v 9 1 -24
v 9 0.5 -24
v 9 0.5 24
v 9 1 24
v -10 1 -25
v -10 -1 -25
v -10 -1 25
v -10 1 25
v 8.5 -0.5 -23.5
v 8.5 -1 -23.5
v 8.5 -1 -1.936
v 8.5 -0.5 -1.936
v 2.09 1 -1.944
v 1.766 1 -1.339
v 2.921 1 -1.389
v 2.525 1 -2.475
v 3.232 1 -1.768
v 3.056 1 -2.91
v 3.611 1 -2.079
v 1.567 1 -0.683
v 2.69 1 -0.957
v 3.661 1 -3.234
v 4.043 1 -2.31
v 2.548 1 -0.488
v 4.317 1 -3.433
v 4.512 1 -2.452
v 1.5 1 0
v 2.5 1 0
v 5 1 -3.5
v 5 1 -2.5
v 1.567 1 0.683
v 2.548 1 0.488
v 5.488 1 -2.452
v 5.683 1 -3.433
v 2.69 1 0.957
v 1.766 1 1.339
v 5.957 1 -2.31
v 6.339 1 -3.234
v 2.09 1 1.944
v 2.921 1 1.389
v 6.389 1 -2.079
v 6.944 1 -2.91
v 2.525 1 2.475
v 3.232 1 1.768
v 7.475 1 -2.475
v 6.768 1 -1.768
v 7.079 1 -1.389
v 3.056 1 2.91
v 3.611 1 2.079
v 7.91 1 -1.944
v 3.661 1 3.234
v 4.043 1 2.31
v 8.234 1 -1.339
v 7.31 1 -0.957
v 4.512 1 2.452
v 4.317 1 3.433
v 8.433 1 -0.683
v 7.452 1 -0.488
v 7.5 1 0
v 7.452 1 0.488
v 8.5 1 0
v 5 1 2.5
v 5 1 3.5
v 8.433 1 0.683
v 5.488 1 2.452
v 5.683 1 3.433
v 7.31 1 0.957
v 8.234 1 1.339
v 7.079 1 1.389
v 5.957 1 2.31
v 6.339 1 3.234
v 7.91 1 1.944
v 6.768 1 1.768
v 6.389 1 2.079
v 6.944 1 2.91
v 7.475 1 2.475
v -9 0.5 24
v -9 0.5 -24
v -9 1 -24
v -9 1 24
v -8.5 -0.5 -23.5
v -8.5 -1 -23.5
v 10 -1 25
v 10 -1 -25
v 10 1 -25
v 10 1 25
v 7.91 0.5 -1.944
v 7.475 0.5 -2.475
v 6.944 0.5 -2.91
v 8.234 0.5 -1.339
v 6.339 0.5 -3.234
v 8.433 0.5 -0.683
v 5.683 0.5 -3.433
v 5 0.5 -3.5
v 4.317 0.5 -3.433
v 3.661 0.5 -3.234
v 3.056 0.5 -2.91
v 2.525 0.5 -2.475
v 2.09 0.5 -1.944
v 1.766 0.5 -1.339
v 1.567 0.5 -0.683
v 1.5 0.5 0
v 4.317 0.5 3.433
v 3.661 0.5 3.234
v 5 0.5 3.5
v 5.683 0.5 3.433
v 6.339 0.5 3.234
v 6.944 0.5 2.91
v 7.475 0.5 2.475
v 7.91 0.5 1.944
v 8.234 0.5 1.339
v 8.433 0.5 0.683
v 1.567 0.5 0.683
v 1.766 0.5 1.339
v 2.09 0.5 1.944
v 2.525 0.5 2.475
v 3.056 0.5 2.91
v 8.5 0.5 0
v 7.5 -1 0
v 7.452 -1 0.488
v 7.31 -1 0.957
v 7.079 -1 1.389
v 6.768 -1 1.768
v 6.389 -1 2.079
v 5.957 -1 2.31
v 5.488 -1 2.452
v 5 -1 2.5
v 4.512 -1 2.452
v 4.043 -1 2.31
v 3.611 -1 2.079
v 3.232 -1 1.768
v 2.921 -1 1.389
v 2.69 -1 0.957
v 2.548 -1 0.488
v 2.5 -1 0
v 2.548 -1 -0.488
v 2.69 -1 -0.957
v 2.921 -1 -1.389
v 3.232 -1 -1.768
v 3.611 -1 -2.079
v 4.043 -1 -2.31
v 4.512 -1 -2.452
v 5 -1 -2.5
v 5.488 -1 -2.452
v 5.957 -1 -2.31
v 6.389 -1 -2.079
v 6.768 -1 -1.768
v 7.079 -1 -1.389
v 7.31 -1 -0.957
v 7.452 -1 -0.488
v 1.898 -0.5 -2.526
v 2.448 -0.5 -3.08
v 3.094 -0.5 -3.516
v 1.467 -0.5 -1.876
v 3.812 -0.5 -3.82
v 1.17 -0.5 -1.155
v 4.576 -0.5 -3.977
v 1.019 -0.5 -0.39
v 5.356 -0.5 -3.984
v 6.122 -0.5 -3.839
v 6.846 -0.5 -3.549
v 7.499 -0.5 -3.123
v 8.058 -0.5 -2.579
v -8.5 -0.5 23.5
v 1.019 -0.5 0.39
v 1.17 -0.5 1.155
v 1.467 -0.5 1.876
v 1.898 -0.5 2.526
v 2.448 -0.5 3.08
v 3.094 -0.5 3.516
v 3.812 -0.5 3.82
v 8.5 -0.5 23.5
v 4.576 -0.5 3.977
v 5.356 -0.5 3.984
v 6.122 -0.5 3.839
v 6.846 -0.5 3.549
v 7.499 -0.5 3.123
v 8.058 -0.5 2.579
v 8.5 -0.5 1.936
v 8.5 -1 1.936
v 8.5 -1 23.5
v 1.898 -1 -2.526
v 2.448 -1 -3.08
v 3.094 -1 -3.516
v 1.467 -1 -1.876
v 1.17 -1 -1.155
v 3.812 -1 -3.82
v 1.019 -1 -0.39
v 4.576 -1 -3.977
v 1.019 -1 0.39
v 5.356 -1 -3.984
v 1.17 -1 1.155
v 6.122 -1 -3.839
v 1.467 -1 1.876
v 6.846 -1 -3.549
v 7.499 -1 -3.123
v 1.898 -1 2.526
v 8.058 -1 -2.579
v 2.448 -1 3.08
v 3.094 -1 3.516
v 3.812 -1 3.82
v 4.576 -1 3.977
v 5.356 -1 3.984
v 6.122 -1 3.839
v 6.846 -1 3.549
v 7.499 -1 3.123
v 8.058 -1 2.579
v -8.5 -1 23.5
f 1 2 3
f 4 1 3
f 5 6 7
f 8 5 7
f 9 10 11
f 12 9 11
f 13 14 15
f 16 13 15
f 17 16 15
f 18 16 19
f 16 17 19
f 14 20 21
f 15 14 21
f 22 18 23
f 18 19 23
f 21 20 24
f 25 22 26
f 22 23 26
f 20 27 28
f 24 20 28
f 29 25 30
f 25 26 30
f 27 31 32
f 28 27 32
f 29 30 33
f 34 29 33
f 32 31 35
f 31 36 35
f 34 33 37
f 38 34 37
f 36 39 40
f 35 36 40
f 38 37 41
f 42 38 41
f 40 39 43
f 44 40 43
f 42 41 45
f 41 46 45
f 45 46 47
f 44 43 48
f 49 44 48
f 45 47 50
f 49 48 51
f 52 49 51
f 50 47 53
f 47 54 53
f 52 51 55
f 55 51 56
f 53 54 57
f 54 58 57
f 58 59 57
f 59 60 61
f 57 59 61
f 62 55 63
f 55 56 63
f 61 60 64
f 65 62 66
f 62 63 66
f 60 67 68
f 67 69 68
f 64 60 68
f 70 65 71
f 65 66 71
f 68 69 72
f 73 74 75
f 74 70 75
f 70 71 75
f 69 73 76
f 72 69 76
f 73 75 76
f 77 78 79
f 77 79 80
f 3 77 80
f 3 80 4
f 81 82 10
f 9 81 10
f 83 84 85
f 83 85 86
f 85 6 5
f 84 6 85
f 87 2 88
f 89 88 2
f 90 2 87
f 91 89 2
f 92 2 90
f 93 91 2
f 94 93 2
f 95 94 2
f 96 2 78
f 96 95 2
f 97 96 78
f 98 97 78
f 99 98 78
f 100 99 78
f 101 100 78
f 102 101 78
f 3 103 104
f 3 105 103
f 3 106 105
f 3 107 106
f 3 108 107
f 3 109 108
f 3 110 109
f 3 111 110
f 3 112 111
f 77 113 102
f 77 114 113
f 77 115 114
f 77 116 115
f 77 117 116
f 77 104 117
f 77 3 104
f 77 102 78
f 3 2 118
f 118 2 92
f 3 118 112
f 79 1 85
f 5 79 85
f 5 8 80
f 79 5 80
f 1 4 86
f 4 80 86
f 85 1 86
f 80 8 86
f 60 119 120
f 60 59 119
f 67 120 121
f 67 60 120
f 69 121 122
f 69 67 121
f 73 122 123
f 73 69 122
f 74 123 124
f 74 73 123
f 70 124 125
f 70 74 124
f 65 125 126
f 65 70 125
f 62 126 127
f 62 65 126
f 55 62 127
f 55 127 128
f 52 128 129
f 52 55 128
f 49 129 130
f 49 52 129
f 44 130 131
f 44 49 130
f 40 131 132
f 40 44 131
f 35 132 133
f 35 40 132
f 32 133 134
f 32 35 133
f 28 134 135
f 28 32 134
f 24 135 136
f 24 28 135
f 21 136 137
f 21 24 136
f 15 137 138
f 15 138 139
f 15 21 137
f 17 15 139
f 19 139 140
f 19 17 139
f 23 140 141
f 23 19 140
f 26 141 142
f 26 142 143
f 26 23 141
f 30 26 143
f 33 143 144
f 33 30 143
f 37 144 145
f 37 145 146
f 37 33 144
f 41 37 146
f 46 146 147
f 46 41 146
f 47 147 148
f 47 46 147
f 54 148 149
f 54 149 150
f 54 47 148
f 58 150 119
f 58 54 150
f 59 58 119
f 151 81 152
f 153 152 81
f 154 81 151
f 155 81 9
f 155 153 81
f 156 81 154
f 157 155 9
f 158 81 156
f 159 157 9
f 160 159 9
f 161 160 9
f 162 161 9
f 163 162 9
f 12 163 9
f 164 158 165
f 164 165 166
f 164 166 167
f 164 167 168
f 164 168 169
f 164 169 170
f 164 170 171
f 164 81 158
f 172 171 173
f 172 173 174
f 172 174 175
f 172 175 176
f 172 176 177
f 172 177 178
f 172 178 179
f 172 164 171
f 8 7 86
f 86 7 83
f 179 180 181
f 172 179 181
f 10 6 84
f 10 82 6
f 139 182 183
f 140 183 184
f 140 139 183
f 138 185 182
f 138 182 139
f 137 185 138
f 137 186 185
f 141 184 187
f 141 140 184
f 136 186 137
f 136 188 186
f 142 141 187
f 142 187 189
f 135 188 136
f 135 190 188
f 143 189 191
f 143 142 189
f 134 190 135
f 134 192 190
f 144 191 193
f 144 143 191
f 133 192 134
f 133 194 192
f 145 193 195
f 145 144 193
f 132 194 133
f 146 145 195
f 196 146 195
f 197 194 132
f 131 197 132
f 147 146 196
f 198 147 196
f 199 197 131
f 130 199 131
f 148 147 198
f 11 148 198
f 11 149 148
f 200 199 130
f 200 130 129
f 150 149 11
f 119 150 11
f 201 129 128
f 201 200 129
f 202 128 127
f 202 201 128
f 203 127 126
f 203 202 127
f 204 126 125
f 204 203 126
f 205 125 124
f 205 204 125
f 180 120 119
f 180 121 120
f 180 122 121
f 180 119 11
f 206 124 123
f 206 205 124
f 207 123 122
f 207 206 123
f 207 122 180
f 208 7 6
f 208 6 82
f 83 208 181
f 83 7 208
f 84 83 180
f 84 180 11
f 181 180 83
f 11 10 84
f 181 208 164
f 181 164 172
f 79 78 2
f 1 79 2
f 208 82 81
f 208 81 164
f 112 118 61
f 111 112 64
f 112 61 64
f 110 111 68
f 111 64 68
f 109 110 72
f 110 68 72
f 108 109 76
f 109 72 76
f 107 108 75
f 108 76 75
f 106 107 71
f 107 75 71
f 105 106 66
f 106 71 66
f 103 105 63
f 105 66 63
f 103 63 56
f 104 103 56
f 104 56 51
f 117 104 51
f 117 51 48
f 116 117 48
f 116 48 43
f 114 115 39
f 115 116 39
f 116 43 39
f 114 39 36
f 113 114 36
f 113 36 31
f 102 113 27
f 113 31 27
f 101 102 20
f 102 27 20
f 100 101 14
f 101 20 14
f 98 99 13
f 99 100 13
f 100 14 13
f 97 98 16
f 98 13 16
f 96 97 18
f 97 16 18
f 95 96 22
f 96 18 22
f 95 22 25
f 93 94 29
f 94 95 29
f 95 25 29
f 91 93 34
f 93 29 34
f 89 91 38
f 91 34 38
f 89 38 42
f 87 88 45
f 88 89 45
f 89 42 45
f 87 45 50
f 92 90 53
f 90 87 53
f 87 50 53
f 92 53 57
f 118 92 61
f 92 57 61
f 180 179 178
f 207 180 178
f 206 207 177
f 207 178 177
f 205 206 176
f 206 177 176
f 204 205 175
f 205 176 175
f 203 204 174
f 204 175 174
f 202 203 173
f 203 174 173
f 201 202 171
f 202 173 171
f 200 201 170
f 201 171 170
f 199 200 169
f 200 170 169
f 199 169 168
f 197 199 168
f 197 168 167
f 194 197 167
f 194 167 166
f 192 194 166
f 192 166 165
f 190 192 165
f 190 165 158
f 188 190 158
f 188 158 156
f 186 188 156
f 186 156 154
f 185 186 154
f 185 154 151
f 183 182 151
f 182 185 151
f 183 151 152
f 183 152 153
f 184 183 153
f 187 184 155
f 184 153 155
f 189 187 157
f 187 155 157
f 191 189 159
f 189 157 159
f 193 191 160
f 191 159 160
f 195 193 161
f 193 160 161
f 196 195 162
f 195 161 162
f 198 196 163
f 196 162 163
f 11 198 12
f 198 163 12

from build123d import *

# Parameters (mm, degrees)
F0_W         = 20
F0_H         = 50
F0_R         = 2.5
F1_DEPTH     = 1
F2_T         = -1.5
F3_T         = 1
F3_T3_DEPTH  = 23.5635083269
F3_T5_DEPTH  = 2.5
F3_T7_DEPTH  = 23.5635083269
F3_T9_DEPTH  = 19
F3_T11_DEPTH = 49
F3_T14_ANGLE = 302.0899512573


# Not quite as in the source:
# - a shell that OpenCascade refuses in one call is made with other operations: the cavity is built on its own and cut out


with BuildPart() as f1:
    # F0 (on Front) → F1 (new body, symmetric)
    with BuildSketch(Plane.XZ):
        Rectangle(F0_W, F0_H)
        with Locations((5, 0)):
            Circle(F0_R, mode=Mode.SUBTRACT)
    extrude(amount=F1_DEPTH, both=True)

    # F2
    f2_openings = [f1.faces().sort_by_distance(p)[0] for p in [
        (-0.100141, -1, 0),
    ]]
    offset(amount=F2_T, openings=f2_openings, kind=Kind.INTERSECTION)

    # F3: shell of thickness 1, made by hand


with BuildPart() as f3_core1:
    # F3_t2: copy of F1
    add(f1.part)

    # the walls: a layer under each face that stays
    f3_faces = [f3_core1.faces().sort_by_distance(p)[0] for p in [
        (10, 0, 0),
        (0, 0, -25),
        (-10, 0, 0),
        (0, 0, 25),
        (2.5, 0, 0),
        (-8.5714285714, -1, -21.4285714286),
        (8.5, -0.75, 12.7182458366),
        (8.5, -0.75, -12.7182458366),
        (0, -0.75, -23.5),
        (-8.5, -0.75, 0),
        (1, -0.75, 0),
        (0, -0.75, 23.5),
        (0, -0.5, 0),
    ]]
    thicken(f3_faces, amount=-F3_T, mode=Mode.SUBTRACT)

    # F3_s4 → F3_t3 (cut)
    with BuildSketch(Plane.XY.offset(0.9364916731)):
        Polygon((8.49, -0.51), (9.5, -0.5), (9.5, 0.5), (8.5, 0.5), align=None)
    extrude(amount=F3_T3_DEPTH, mode=Mode.SUBTRACT)

    # F3_s6 → F3_t5 (cut)
    with BuildSketch(Plane.XZ.offset(-0.5)):
        Polygon((8.49, 23.49), (9.5, 23.5), (9.5, 24.5), (8.5, 24.5), align=None)
        Polygon((8.49875, 1.9413329023), (9.5, 1.9364916731), (9.5, -1.9364916731), (7.625, 1.4523687548), align=None)
        Polygon((8.49, -23.49), (9.5, -23.5), (9.5, -24.5), (8.5, -24.5), align=None)
        Polygon((8.49875, -1.9413329023), (9.5, -1.9364916731), (9.5, 1.9364916731), (7.625, -1.4523687548), align=None)
        Polygon((-8.49, -23.49), (-8.5, -24.5), (-9.5, -24.5), (-9.5, -23.5), align=None)
        Polygon((-8.49, 23.49), (-9.5, 23.5), (-9.5, 24.5), (-8.5, 24.5), align=None)
    extrude(amount=F3_T5_DEPTH, mode=Mode.SUBTRACT)

    # F3_s8 → F3_t7 (cut)
    with BuildSketch(Plane.XY.offset(-24.5)):
        Polygon((8.49, -0.51), (9.5, -0.5), (9.5, 0.5), (8.5, 0.5), align=None)
    extrude(amount=F3_T7_DEPTH, mode=Mode.SUBTRACT)

    # F3_s10 → F3_t9 (cut)
    with BuildSketch(Plane.YZ.offset(-9.5)):
        Polygon((-0.51, -23.49), (-0.5, -24.5), (0.5, -24.5), (0.5, -23.5), align=None)
        Polygon((-0.51, 23.49), (-0.5, 24.5), (0.5, 24.5), (0.5, 23.5), align=None)
    extrude(amount=F3_T9_DEPTH, mode=Mode.SUBTRACT)

    # F3_s12 → F3_t11 (cut)
    with BuildSketch(Plane.XY.offset(-24.5)):
        Polygon((-8.49, -0.51), (-9.5, -0.5), (-9.5, 0.5), (-8.5, 0.5), align=None)
    extrude(amount=F3_T11_DEPTH, mode=Mode.SUBTRACT)

    # F3_s13 → F3_t14 (revolve, cut)
    with BuildSketch(Plane(origin=(1.171875, 0, 2.1180377675), x_dir=(0, 1, 0), z_dir=(0.4841229183, 0, 0.875))):
        Polygon((-0.51, -8.385), (-0.5, -7.375), (0.5, -7.375), (0.5, -8.375), align=None)
    revolve(axis=Axis((5, -0.5, 0), (0, 1, 0)), revolution_arc=F3_T14_ANGLE, mode=Mode.SUBTRACT)


with BuildPart() as f1_1:
    add(f1.part)

    # what is left inside the walls is the cavity
    f3_cavity = [f3_core1.part.solids().sort_by_distance(p)[0] for p in [
        (0, 0.99, -8),
    ]]
    add(f3_cavity, mode=Mode.SUBTRACT)


solid = f1_1.part
